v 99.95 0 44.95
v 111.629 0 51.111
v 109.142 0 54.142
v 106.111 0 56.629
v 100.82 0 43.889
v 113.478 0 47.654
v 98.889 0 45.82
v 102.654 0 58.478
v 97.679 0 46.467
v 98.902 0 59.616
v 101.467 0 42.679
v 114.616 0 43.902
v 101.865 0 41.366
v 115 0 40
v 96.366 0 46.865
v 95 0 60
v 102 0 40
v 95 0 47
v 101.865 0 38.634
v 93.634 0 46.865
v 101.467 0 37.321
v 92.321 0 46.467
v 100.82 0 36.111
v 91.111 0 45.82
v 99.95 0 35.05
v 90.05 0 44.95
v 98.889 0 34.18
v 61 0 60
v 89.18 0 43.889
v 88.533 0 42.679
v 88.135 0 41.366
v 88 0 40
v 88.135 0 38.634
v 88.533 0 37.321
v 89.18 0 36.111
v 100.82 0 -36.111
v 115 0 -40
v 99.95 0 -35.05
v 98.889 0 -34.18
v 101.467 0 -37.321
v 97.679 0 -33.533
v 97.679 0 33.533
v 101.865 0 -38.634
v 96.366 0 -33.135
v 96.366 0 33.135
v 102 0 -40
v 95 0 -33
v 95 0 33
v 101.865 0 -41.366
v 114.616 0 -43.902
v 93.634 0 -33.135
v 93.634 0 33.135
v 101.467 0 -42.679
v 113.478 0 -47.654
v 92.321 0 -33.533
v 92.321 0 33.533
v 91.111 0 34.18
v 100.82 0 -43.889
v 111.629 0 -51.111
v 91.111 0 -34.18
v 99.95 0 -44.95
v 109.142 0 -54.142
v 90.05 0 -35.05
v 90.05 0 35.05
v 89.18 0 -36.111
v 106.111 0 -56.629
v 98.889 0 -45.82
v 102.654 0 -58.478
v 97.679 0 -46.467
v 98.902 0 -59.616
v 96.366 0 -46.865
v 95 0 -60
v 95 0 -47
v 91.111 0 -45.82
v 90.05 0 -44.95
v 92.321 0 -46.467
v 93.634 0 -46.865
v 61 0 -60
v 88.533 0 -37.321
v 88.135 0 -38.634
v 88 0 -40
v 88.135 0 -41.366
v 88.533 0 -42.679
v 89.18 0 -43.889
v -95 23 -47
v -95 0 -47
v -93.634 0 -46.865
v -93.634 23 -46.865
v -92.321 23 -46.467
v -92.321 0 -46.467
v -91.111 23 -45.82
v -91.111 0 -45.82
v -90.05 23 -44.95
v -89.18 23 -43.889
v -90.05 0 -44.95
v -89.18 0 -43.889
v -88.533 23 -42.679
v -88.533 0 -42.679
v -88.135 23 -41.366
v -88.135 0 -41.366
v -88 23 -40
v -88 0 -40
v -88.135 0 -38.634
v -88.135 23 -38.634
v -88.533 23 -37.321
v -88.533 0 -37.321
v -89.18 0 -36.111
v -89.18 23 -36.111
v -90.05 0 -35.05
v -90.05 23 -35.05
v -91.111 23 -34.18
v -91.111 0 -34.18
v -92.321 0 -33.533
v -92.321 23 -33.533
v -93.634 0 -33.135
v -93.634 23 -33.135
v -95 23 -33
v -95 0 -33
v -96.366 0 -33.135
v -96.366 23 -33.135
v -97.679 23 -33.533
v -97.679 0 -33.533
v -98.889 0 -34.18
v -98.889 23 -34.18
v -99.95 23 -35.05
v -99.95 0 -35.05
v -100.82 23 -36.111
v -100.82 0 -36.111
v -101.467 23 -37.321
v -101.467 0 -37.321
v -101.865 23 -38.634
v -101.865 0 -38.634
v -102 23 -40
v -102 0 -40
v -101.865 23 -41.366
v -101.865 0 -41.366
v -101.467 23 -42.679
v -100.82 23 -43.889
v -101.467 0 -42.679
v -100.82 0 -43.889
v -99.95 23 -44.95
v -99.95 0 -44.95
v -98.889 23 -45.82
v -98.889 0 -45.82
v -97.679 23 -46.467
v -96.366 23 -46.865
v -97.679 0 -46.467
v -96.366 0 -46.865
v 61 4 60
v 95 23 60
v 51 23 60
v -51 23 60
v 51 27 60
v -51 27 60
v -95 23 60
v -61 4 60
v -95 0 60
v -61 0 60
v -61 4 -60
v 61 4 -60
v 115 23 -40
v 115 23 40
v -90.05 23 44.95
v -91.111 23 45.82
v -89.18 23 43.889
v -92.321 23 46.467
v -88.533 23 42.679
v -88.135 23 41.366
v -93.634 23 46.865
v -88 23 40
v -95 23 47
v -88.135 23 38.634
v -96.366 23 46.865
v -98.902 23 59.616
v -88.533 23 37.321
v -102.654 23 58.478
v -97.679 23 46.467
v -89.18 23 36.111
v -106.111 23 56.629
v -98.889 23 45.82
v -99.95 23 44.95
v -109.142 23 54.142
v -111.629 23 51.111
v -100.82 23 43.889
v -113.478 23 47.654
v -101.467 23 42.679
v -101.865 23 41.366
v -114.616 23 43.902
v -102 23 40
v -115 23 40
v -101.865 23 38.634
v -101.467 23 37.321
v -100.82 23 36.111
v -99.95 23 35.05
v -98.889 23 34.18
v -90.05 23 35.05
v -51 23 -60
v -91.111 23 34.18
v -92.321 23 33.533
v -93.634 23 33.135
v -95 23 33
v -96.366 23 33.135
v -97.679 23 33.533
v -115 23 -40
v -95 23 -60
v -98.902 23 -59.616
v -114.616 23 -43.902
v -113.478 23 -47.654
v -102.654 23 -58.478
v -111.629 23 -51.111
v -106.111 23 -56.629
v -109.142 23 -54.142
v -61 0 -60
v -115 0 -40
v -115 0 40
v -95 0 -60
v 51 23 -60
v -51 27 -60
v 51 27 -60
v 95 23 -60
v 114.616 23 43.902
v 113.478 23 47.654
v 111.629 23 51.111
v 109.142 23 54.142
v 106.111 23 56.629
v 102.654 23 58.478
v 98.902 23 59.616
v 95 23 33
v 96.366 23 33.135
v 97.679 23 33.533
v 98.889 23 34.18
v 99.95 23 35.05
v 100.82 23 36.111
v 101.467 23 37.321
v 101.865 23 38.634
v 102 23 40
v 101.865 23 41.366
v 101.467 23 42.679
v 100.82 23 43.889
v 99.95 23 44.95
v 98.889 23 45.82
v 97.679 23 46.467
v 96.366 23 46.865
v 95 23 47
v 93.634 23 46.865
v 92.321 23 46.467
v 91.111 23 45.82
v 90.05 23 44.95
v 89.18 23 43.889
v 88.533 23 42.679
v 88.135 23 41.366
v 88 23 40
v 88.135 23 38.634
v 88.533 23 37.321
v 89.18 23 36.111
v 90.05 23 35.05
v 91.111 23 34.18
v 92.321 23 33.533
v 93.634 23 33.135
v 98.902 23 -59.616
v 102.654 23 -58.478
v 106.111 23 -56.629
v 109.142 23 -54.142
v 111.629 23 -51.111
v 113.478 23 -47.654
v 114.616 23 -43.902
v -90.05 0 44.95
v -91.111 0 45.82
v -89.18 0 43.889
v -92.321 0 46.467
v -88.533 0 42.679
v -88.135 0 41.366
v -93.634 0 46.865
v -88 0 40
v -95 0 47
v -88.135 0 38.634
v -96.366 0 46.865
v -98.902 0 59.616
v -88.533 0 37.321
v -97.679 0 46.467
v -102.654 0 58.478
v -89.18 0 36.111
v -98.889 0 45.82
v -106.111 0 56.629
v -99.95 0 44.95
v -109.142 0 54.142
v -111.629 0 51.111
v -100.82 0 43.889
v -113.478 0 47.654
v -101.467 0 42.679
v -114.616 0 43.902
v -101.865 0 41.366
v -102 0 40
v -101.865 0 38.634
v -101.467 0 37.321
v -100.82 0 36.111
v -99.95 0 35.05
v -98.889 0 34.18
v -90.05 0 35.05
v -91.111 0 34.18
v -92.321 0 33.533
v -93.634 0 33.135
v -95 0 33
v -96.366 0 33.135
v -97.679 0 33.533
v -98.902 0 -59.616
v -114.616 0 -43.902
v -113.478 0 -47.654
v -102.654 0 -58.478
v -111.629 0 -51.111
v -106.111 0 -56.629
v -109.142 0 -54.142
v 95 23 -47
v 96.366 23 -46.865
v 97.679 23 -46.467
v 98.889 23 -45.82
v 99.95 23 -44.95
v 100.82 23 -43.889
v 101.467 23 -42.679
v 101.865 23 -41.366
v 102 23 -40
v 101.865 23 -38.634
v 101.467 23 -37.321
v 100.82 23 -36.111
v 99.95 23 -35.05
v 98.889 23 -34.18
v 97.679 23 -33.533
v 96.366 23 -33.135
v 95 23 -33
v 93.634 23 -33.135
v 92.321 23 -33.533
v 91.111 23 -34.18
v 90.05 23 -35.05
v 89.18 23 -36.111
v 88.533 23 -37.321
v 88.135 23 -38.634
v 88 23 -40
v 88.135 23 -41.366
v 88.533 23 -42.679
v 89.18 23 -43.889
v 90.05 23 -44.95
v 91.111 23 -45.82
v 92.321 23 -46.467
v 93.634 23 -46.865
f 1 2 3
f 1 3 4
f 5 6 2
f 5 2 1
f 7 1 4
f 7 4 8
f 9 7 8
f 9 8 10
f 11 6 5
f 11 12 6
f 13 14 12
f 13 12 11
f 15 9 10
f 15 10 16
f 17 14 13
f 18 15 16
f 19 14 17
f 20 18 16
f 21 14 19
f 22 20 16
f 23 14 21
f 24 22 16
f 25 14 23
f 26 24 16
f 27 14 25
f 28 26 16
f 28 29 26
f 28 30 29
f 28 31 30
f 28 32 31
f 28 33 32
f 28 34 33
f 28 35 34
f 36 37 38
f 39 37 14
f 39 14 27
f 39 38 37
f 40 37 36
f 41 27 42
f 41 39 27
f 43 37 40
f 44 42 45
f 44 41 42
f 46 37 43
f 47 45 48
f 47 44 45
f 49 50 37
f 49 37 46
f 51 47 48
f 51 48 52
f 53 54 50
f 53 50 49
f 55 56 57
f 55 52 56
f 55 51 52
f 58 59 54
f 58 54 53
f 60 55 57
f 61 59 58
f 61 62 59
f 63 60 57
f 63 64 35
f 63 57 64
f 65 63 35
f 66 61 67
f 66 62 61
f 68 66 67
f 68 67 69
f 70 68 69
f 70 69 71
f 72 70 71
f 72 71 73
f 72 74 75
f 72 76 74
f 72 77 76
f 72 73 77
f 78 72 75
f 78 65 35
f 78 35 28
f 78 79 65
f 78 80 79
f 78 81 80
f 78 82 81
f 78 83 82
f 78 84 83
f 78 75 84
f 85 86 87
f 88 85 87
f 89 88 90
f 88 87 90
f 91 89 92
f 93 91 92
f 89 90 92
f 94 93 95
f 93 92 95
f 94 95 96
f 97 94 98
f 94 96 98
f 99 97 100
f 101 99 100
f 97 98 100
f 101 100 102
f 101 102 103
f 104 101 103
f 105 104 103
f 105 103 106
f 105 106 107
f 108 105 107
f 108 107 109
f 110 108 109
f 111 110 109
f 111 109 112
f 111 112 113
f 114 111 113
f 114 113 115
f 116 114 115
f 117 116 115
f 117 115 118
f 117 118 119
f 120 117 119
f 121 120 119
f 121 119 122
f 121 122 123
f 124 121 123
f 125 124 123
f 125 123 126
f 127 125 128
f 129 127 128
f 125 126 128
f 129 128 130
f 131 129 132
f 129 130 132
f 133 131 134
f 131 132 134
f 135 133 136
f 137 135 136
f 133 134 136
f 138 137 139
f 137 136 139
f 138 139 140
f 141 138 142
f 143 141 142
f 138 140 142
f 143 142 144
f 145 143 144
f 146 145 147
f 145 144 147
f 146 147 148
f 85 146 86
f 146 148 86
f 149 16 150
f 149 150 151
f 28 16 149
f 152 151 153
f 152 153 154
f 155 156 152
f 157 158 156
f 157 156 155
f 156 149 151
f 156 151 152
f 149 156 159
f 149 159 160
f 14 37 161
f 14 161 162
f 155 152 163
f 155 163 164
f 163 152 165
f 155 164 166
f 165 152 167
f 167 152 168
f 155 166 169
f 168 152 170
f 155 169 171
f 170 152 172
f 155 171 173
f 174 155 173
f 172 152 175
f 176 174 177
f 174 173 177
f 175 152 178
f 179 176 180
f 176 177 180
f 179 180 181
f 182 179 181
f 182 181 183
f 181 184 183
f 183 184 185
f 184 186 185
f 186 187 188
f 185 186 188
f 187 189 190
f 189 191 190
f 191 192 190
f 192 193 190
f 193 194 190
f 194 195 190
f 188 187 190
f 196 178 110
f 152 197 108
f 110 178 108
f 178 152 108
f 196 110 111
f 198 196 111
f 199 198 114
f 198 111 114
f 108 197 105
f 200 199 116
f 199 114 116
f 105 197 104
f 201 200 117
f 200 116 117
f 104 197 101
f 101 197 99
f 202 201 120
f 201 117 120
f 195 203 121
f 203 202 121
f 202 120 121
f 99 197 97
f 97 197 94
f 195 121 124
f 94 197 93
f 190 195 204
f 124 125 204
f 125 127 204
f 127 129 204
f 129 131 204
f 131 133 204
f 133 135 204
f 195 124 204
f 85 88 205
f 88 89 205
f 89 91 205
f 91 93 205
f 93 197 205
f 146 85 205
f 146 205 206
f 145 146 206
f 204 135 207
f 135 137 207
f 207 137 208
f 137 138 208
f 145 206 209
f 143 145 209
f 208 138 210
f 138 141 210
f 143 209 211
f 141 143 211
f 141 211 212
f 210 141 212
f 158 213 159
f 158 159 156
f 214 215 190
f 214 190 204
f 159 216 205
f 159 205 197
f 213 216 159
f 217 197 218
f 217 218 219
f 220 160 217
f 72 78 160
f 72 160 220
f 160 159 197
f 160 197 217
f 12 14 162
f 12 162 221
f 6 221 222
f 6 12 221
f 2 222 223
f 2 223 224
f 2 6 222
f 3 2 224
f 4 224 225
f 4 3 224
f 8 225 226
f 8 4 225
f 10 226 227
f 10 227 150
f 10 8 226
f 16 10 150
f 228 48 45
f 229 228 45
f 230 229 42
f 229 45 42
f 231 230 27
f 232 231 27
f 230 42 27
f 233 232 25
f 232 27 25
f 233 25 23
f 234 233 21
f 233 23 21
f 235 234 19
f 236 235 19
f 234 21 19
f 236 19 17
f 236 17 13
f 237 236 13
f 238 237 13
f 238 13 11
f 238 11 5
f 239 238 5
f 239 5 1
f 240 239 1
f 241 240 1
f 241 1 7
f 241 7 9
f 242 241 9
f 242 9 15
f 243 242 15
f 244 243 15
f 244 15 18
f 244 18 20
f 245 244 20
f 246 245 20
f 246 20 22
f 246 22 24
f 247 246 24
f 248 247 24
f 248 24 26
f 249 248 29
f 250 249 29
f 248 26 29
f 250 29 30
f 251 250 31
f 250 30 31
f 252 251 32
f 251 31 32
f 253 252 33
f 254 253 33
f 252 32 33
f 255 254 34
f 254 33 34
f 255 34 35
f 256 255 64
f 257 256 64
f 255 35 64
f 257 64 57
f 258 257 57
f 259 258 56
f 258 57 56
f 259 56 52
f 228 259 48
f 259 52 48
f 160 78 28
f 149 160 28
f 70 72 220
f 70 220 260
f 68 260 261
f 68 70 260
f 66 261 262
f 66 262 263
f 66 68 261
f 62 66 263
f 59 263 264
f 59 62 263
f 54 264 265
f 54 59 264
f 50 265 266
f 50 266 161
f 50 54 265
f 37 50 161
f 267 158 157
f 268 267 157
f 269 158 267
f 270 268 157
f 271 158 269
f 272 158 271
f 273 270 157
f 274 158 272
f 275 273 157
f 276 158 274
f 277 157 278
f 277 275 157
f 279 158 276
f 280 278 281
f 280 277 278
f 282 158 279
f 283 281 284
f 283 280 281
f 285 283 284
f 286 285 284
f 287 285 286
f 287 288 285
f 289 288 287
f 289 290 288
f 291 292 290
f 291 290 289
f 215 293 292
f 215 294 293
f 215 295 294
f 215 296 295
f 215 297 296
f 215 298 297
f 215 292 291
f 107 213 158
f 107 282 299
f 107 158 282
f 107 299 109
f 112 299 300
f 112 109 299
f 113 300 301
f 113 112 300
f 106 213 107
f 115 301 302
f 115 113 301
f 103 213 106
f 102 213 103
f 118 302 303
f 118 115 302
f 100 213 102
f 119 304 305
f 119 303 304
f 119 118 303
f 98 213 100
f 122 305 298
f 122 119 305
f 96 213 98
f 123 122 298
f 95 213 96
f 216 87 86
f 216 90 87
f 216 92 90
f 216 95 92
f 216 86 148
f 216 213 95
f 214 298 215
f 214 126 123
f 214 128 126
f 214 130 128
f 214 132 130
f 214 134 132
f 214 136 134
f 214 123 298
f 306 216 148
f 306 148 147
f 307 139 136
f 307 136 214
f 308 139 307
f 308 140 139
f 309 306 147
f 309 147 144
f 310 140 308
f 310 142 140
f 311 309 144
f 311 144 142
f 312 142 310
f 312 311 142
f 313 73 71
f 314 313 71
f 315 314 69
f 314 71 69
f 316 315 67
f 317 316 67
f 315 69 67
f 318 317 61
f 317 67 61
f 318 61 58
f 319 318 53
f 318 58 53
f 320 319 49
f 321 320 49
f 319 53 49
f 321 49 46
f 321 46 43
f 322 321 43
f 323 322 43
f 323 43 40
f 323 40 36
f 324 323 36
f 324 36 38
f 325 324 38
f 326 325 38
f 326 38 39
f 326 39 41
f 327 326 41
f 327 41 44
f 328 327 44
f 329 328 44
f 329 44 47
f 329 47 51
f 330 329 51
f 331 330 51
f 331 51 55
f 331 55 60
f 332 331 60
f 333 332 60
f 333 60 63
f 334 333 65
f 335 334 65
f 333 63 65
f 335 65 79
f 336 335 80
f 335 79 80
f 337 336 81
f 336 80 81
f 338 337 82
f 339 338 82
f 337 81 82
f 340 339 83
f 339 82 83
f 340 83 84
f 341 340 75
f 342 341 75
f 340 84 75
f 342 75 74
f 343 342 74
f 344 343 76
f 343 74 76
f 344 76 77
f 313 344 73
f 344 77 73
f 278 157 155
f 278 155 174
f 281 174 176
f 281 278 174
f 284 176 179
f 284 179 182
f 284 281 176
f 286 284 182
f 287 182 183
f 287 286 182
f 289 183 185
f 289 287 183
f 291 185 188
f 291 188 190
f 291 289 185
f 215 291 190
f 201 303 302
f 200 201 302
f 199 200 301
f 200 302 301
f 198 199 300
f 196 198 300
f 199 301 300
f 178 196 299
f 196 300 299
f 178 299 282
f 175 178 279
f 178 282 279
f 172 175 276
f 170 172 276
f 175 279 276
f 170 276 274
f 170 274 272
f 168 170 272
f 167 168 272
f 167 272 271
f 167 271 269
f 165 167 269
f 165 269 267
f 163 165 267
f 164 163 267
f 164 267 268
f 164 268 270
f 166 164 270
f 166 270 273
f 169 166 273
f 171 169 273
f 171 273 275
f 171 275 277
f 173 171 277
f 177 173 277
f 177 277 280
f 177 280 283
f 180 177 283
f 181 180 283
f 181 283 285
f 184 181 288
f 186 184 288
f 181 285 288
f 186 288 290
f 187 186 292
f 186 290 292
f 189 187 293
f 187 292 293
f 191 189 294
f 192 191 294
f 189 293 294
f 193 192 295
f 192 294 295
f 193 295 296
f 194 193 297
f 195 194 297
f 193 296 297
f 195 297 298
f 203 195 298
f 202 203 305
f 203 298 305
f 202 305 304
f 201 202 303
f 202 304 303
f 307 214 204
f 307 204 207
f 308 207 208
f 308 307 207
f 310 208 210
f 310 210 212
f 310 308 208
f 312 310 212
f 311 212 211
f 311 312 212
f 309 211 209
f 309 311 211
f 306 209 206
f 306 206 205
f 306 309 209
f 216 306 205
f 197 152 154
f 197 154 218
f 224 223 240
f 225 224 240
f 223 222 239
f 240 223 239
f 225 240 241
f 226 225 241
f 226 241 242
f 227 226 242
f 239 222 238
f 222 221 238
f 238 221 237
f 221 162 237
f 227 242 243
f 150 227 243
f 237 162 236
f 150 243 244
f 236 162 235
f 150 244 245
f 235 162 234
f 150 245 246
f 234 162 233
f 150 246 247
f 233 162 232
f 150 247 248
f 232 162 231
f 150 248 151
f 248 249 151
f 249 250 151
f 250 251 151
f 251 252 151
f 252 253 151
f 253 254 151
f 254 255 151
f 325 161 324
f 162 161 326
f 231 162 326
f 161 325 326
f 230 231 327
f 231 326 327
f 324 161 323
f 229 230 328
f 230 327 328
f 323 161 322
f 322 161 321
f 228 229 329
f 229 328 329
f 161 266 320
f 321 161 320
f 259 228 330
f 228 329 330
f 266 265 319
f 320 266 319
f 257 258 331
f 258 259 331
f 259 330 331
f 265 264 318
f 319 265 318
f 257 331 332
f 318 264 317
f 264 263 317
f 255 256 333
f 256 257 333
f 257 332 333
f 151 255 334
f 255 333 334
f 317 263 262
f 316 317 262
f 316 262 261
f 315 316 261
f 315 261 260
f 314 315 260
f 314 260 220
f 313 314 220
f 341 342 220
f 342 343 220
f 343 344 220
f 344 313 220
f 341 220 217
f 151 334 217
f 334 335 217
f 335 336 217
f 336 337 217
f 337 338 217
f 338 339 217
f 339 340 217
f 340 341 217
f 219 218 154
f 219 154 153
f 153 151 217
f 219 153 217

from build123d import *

# Parameters (mm, degrees)
BOSS_EXTRUDE1_DEPTH = 23
SKETCH3_W           = 102
SKETCH3_H           = 120
BOSS_EXTRUDE2_DEPTH = 4
SKETCH4_W           = 122
SKETCH4_H           = 120
CUT_EXTRUDE1_DEPTH  = 4
M16_TAPPED_HOLE1_D  = 14


with BuildPart() as part:
    # Sketch1 → Boss-Extrude1 (new body)
    with BuildSketch(Plane(origin=(0, 0, 0), x_dir=(1, 0, 0), z_dir=(0, 1, 0))):
        with BuildLine():
            Line((-95, 60), (95, 60))
            ThreePointArc((95, 60), (109.142135624, 54.142135624), (115, 40))
            Line((115, 40), (115, -40))
            ThreePointArc((115, -40), (109.142135624, -54.142135624), (95, -60))
            Line((95, -60), (-95, -60))
            ThreePointArc((-95, -60), (-109.142135624, -54.142135624), (-115, -40))
            Line((-115, -40), (-115, 40))
            ThreePointArc((-115, 40), (-109.142135624, 54.142135624), (-95, 60))
        make_face()
    extrude(amount=BOSS_EXTRUDE1_DEPTH)

    # Sketch3 → Boss-Extrude2 (add)
    with BuildSketch(Plane(origin=(0, 23, 0), x_dir=(1, 0, 0), z_dir=(0, 1, 0))):
        Rectangle(SKETCH3_W, SKETCH3_H)
    extrude(amount=BOSS_EXTRUDE2_DEPTH)

    # Sketch4 → Cut-Extrude1 (cut)
    with BuildSketch(Plane.XZ):
        Rectangle(SKETCH4_W, SKETCH4_H)
    extrude(amount=-CUT_EXTRUDE1_DEPTH, mode=Mode.SUBTRACT)

    # M16 Tapped Hole1 (through all)
    with Locations(Plane(origin=(-95, 23, -40), x_dir=(0, 0, 1), z_dir=(0, 1, 0))):
        with Locations((0, 0), (80, 0), (0, 190), (80, 190)):
            Hole(M16_TAPPED_HOLE1_D / 2)


solid = part.part
